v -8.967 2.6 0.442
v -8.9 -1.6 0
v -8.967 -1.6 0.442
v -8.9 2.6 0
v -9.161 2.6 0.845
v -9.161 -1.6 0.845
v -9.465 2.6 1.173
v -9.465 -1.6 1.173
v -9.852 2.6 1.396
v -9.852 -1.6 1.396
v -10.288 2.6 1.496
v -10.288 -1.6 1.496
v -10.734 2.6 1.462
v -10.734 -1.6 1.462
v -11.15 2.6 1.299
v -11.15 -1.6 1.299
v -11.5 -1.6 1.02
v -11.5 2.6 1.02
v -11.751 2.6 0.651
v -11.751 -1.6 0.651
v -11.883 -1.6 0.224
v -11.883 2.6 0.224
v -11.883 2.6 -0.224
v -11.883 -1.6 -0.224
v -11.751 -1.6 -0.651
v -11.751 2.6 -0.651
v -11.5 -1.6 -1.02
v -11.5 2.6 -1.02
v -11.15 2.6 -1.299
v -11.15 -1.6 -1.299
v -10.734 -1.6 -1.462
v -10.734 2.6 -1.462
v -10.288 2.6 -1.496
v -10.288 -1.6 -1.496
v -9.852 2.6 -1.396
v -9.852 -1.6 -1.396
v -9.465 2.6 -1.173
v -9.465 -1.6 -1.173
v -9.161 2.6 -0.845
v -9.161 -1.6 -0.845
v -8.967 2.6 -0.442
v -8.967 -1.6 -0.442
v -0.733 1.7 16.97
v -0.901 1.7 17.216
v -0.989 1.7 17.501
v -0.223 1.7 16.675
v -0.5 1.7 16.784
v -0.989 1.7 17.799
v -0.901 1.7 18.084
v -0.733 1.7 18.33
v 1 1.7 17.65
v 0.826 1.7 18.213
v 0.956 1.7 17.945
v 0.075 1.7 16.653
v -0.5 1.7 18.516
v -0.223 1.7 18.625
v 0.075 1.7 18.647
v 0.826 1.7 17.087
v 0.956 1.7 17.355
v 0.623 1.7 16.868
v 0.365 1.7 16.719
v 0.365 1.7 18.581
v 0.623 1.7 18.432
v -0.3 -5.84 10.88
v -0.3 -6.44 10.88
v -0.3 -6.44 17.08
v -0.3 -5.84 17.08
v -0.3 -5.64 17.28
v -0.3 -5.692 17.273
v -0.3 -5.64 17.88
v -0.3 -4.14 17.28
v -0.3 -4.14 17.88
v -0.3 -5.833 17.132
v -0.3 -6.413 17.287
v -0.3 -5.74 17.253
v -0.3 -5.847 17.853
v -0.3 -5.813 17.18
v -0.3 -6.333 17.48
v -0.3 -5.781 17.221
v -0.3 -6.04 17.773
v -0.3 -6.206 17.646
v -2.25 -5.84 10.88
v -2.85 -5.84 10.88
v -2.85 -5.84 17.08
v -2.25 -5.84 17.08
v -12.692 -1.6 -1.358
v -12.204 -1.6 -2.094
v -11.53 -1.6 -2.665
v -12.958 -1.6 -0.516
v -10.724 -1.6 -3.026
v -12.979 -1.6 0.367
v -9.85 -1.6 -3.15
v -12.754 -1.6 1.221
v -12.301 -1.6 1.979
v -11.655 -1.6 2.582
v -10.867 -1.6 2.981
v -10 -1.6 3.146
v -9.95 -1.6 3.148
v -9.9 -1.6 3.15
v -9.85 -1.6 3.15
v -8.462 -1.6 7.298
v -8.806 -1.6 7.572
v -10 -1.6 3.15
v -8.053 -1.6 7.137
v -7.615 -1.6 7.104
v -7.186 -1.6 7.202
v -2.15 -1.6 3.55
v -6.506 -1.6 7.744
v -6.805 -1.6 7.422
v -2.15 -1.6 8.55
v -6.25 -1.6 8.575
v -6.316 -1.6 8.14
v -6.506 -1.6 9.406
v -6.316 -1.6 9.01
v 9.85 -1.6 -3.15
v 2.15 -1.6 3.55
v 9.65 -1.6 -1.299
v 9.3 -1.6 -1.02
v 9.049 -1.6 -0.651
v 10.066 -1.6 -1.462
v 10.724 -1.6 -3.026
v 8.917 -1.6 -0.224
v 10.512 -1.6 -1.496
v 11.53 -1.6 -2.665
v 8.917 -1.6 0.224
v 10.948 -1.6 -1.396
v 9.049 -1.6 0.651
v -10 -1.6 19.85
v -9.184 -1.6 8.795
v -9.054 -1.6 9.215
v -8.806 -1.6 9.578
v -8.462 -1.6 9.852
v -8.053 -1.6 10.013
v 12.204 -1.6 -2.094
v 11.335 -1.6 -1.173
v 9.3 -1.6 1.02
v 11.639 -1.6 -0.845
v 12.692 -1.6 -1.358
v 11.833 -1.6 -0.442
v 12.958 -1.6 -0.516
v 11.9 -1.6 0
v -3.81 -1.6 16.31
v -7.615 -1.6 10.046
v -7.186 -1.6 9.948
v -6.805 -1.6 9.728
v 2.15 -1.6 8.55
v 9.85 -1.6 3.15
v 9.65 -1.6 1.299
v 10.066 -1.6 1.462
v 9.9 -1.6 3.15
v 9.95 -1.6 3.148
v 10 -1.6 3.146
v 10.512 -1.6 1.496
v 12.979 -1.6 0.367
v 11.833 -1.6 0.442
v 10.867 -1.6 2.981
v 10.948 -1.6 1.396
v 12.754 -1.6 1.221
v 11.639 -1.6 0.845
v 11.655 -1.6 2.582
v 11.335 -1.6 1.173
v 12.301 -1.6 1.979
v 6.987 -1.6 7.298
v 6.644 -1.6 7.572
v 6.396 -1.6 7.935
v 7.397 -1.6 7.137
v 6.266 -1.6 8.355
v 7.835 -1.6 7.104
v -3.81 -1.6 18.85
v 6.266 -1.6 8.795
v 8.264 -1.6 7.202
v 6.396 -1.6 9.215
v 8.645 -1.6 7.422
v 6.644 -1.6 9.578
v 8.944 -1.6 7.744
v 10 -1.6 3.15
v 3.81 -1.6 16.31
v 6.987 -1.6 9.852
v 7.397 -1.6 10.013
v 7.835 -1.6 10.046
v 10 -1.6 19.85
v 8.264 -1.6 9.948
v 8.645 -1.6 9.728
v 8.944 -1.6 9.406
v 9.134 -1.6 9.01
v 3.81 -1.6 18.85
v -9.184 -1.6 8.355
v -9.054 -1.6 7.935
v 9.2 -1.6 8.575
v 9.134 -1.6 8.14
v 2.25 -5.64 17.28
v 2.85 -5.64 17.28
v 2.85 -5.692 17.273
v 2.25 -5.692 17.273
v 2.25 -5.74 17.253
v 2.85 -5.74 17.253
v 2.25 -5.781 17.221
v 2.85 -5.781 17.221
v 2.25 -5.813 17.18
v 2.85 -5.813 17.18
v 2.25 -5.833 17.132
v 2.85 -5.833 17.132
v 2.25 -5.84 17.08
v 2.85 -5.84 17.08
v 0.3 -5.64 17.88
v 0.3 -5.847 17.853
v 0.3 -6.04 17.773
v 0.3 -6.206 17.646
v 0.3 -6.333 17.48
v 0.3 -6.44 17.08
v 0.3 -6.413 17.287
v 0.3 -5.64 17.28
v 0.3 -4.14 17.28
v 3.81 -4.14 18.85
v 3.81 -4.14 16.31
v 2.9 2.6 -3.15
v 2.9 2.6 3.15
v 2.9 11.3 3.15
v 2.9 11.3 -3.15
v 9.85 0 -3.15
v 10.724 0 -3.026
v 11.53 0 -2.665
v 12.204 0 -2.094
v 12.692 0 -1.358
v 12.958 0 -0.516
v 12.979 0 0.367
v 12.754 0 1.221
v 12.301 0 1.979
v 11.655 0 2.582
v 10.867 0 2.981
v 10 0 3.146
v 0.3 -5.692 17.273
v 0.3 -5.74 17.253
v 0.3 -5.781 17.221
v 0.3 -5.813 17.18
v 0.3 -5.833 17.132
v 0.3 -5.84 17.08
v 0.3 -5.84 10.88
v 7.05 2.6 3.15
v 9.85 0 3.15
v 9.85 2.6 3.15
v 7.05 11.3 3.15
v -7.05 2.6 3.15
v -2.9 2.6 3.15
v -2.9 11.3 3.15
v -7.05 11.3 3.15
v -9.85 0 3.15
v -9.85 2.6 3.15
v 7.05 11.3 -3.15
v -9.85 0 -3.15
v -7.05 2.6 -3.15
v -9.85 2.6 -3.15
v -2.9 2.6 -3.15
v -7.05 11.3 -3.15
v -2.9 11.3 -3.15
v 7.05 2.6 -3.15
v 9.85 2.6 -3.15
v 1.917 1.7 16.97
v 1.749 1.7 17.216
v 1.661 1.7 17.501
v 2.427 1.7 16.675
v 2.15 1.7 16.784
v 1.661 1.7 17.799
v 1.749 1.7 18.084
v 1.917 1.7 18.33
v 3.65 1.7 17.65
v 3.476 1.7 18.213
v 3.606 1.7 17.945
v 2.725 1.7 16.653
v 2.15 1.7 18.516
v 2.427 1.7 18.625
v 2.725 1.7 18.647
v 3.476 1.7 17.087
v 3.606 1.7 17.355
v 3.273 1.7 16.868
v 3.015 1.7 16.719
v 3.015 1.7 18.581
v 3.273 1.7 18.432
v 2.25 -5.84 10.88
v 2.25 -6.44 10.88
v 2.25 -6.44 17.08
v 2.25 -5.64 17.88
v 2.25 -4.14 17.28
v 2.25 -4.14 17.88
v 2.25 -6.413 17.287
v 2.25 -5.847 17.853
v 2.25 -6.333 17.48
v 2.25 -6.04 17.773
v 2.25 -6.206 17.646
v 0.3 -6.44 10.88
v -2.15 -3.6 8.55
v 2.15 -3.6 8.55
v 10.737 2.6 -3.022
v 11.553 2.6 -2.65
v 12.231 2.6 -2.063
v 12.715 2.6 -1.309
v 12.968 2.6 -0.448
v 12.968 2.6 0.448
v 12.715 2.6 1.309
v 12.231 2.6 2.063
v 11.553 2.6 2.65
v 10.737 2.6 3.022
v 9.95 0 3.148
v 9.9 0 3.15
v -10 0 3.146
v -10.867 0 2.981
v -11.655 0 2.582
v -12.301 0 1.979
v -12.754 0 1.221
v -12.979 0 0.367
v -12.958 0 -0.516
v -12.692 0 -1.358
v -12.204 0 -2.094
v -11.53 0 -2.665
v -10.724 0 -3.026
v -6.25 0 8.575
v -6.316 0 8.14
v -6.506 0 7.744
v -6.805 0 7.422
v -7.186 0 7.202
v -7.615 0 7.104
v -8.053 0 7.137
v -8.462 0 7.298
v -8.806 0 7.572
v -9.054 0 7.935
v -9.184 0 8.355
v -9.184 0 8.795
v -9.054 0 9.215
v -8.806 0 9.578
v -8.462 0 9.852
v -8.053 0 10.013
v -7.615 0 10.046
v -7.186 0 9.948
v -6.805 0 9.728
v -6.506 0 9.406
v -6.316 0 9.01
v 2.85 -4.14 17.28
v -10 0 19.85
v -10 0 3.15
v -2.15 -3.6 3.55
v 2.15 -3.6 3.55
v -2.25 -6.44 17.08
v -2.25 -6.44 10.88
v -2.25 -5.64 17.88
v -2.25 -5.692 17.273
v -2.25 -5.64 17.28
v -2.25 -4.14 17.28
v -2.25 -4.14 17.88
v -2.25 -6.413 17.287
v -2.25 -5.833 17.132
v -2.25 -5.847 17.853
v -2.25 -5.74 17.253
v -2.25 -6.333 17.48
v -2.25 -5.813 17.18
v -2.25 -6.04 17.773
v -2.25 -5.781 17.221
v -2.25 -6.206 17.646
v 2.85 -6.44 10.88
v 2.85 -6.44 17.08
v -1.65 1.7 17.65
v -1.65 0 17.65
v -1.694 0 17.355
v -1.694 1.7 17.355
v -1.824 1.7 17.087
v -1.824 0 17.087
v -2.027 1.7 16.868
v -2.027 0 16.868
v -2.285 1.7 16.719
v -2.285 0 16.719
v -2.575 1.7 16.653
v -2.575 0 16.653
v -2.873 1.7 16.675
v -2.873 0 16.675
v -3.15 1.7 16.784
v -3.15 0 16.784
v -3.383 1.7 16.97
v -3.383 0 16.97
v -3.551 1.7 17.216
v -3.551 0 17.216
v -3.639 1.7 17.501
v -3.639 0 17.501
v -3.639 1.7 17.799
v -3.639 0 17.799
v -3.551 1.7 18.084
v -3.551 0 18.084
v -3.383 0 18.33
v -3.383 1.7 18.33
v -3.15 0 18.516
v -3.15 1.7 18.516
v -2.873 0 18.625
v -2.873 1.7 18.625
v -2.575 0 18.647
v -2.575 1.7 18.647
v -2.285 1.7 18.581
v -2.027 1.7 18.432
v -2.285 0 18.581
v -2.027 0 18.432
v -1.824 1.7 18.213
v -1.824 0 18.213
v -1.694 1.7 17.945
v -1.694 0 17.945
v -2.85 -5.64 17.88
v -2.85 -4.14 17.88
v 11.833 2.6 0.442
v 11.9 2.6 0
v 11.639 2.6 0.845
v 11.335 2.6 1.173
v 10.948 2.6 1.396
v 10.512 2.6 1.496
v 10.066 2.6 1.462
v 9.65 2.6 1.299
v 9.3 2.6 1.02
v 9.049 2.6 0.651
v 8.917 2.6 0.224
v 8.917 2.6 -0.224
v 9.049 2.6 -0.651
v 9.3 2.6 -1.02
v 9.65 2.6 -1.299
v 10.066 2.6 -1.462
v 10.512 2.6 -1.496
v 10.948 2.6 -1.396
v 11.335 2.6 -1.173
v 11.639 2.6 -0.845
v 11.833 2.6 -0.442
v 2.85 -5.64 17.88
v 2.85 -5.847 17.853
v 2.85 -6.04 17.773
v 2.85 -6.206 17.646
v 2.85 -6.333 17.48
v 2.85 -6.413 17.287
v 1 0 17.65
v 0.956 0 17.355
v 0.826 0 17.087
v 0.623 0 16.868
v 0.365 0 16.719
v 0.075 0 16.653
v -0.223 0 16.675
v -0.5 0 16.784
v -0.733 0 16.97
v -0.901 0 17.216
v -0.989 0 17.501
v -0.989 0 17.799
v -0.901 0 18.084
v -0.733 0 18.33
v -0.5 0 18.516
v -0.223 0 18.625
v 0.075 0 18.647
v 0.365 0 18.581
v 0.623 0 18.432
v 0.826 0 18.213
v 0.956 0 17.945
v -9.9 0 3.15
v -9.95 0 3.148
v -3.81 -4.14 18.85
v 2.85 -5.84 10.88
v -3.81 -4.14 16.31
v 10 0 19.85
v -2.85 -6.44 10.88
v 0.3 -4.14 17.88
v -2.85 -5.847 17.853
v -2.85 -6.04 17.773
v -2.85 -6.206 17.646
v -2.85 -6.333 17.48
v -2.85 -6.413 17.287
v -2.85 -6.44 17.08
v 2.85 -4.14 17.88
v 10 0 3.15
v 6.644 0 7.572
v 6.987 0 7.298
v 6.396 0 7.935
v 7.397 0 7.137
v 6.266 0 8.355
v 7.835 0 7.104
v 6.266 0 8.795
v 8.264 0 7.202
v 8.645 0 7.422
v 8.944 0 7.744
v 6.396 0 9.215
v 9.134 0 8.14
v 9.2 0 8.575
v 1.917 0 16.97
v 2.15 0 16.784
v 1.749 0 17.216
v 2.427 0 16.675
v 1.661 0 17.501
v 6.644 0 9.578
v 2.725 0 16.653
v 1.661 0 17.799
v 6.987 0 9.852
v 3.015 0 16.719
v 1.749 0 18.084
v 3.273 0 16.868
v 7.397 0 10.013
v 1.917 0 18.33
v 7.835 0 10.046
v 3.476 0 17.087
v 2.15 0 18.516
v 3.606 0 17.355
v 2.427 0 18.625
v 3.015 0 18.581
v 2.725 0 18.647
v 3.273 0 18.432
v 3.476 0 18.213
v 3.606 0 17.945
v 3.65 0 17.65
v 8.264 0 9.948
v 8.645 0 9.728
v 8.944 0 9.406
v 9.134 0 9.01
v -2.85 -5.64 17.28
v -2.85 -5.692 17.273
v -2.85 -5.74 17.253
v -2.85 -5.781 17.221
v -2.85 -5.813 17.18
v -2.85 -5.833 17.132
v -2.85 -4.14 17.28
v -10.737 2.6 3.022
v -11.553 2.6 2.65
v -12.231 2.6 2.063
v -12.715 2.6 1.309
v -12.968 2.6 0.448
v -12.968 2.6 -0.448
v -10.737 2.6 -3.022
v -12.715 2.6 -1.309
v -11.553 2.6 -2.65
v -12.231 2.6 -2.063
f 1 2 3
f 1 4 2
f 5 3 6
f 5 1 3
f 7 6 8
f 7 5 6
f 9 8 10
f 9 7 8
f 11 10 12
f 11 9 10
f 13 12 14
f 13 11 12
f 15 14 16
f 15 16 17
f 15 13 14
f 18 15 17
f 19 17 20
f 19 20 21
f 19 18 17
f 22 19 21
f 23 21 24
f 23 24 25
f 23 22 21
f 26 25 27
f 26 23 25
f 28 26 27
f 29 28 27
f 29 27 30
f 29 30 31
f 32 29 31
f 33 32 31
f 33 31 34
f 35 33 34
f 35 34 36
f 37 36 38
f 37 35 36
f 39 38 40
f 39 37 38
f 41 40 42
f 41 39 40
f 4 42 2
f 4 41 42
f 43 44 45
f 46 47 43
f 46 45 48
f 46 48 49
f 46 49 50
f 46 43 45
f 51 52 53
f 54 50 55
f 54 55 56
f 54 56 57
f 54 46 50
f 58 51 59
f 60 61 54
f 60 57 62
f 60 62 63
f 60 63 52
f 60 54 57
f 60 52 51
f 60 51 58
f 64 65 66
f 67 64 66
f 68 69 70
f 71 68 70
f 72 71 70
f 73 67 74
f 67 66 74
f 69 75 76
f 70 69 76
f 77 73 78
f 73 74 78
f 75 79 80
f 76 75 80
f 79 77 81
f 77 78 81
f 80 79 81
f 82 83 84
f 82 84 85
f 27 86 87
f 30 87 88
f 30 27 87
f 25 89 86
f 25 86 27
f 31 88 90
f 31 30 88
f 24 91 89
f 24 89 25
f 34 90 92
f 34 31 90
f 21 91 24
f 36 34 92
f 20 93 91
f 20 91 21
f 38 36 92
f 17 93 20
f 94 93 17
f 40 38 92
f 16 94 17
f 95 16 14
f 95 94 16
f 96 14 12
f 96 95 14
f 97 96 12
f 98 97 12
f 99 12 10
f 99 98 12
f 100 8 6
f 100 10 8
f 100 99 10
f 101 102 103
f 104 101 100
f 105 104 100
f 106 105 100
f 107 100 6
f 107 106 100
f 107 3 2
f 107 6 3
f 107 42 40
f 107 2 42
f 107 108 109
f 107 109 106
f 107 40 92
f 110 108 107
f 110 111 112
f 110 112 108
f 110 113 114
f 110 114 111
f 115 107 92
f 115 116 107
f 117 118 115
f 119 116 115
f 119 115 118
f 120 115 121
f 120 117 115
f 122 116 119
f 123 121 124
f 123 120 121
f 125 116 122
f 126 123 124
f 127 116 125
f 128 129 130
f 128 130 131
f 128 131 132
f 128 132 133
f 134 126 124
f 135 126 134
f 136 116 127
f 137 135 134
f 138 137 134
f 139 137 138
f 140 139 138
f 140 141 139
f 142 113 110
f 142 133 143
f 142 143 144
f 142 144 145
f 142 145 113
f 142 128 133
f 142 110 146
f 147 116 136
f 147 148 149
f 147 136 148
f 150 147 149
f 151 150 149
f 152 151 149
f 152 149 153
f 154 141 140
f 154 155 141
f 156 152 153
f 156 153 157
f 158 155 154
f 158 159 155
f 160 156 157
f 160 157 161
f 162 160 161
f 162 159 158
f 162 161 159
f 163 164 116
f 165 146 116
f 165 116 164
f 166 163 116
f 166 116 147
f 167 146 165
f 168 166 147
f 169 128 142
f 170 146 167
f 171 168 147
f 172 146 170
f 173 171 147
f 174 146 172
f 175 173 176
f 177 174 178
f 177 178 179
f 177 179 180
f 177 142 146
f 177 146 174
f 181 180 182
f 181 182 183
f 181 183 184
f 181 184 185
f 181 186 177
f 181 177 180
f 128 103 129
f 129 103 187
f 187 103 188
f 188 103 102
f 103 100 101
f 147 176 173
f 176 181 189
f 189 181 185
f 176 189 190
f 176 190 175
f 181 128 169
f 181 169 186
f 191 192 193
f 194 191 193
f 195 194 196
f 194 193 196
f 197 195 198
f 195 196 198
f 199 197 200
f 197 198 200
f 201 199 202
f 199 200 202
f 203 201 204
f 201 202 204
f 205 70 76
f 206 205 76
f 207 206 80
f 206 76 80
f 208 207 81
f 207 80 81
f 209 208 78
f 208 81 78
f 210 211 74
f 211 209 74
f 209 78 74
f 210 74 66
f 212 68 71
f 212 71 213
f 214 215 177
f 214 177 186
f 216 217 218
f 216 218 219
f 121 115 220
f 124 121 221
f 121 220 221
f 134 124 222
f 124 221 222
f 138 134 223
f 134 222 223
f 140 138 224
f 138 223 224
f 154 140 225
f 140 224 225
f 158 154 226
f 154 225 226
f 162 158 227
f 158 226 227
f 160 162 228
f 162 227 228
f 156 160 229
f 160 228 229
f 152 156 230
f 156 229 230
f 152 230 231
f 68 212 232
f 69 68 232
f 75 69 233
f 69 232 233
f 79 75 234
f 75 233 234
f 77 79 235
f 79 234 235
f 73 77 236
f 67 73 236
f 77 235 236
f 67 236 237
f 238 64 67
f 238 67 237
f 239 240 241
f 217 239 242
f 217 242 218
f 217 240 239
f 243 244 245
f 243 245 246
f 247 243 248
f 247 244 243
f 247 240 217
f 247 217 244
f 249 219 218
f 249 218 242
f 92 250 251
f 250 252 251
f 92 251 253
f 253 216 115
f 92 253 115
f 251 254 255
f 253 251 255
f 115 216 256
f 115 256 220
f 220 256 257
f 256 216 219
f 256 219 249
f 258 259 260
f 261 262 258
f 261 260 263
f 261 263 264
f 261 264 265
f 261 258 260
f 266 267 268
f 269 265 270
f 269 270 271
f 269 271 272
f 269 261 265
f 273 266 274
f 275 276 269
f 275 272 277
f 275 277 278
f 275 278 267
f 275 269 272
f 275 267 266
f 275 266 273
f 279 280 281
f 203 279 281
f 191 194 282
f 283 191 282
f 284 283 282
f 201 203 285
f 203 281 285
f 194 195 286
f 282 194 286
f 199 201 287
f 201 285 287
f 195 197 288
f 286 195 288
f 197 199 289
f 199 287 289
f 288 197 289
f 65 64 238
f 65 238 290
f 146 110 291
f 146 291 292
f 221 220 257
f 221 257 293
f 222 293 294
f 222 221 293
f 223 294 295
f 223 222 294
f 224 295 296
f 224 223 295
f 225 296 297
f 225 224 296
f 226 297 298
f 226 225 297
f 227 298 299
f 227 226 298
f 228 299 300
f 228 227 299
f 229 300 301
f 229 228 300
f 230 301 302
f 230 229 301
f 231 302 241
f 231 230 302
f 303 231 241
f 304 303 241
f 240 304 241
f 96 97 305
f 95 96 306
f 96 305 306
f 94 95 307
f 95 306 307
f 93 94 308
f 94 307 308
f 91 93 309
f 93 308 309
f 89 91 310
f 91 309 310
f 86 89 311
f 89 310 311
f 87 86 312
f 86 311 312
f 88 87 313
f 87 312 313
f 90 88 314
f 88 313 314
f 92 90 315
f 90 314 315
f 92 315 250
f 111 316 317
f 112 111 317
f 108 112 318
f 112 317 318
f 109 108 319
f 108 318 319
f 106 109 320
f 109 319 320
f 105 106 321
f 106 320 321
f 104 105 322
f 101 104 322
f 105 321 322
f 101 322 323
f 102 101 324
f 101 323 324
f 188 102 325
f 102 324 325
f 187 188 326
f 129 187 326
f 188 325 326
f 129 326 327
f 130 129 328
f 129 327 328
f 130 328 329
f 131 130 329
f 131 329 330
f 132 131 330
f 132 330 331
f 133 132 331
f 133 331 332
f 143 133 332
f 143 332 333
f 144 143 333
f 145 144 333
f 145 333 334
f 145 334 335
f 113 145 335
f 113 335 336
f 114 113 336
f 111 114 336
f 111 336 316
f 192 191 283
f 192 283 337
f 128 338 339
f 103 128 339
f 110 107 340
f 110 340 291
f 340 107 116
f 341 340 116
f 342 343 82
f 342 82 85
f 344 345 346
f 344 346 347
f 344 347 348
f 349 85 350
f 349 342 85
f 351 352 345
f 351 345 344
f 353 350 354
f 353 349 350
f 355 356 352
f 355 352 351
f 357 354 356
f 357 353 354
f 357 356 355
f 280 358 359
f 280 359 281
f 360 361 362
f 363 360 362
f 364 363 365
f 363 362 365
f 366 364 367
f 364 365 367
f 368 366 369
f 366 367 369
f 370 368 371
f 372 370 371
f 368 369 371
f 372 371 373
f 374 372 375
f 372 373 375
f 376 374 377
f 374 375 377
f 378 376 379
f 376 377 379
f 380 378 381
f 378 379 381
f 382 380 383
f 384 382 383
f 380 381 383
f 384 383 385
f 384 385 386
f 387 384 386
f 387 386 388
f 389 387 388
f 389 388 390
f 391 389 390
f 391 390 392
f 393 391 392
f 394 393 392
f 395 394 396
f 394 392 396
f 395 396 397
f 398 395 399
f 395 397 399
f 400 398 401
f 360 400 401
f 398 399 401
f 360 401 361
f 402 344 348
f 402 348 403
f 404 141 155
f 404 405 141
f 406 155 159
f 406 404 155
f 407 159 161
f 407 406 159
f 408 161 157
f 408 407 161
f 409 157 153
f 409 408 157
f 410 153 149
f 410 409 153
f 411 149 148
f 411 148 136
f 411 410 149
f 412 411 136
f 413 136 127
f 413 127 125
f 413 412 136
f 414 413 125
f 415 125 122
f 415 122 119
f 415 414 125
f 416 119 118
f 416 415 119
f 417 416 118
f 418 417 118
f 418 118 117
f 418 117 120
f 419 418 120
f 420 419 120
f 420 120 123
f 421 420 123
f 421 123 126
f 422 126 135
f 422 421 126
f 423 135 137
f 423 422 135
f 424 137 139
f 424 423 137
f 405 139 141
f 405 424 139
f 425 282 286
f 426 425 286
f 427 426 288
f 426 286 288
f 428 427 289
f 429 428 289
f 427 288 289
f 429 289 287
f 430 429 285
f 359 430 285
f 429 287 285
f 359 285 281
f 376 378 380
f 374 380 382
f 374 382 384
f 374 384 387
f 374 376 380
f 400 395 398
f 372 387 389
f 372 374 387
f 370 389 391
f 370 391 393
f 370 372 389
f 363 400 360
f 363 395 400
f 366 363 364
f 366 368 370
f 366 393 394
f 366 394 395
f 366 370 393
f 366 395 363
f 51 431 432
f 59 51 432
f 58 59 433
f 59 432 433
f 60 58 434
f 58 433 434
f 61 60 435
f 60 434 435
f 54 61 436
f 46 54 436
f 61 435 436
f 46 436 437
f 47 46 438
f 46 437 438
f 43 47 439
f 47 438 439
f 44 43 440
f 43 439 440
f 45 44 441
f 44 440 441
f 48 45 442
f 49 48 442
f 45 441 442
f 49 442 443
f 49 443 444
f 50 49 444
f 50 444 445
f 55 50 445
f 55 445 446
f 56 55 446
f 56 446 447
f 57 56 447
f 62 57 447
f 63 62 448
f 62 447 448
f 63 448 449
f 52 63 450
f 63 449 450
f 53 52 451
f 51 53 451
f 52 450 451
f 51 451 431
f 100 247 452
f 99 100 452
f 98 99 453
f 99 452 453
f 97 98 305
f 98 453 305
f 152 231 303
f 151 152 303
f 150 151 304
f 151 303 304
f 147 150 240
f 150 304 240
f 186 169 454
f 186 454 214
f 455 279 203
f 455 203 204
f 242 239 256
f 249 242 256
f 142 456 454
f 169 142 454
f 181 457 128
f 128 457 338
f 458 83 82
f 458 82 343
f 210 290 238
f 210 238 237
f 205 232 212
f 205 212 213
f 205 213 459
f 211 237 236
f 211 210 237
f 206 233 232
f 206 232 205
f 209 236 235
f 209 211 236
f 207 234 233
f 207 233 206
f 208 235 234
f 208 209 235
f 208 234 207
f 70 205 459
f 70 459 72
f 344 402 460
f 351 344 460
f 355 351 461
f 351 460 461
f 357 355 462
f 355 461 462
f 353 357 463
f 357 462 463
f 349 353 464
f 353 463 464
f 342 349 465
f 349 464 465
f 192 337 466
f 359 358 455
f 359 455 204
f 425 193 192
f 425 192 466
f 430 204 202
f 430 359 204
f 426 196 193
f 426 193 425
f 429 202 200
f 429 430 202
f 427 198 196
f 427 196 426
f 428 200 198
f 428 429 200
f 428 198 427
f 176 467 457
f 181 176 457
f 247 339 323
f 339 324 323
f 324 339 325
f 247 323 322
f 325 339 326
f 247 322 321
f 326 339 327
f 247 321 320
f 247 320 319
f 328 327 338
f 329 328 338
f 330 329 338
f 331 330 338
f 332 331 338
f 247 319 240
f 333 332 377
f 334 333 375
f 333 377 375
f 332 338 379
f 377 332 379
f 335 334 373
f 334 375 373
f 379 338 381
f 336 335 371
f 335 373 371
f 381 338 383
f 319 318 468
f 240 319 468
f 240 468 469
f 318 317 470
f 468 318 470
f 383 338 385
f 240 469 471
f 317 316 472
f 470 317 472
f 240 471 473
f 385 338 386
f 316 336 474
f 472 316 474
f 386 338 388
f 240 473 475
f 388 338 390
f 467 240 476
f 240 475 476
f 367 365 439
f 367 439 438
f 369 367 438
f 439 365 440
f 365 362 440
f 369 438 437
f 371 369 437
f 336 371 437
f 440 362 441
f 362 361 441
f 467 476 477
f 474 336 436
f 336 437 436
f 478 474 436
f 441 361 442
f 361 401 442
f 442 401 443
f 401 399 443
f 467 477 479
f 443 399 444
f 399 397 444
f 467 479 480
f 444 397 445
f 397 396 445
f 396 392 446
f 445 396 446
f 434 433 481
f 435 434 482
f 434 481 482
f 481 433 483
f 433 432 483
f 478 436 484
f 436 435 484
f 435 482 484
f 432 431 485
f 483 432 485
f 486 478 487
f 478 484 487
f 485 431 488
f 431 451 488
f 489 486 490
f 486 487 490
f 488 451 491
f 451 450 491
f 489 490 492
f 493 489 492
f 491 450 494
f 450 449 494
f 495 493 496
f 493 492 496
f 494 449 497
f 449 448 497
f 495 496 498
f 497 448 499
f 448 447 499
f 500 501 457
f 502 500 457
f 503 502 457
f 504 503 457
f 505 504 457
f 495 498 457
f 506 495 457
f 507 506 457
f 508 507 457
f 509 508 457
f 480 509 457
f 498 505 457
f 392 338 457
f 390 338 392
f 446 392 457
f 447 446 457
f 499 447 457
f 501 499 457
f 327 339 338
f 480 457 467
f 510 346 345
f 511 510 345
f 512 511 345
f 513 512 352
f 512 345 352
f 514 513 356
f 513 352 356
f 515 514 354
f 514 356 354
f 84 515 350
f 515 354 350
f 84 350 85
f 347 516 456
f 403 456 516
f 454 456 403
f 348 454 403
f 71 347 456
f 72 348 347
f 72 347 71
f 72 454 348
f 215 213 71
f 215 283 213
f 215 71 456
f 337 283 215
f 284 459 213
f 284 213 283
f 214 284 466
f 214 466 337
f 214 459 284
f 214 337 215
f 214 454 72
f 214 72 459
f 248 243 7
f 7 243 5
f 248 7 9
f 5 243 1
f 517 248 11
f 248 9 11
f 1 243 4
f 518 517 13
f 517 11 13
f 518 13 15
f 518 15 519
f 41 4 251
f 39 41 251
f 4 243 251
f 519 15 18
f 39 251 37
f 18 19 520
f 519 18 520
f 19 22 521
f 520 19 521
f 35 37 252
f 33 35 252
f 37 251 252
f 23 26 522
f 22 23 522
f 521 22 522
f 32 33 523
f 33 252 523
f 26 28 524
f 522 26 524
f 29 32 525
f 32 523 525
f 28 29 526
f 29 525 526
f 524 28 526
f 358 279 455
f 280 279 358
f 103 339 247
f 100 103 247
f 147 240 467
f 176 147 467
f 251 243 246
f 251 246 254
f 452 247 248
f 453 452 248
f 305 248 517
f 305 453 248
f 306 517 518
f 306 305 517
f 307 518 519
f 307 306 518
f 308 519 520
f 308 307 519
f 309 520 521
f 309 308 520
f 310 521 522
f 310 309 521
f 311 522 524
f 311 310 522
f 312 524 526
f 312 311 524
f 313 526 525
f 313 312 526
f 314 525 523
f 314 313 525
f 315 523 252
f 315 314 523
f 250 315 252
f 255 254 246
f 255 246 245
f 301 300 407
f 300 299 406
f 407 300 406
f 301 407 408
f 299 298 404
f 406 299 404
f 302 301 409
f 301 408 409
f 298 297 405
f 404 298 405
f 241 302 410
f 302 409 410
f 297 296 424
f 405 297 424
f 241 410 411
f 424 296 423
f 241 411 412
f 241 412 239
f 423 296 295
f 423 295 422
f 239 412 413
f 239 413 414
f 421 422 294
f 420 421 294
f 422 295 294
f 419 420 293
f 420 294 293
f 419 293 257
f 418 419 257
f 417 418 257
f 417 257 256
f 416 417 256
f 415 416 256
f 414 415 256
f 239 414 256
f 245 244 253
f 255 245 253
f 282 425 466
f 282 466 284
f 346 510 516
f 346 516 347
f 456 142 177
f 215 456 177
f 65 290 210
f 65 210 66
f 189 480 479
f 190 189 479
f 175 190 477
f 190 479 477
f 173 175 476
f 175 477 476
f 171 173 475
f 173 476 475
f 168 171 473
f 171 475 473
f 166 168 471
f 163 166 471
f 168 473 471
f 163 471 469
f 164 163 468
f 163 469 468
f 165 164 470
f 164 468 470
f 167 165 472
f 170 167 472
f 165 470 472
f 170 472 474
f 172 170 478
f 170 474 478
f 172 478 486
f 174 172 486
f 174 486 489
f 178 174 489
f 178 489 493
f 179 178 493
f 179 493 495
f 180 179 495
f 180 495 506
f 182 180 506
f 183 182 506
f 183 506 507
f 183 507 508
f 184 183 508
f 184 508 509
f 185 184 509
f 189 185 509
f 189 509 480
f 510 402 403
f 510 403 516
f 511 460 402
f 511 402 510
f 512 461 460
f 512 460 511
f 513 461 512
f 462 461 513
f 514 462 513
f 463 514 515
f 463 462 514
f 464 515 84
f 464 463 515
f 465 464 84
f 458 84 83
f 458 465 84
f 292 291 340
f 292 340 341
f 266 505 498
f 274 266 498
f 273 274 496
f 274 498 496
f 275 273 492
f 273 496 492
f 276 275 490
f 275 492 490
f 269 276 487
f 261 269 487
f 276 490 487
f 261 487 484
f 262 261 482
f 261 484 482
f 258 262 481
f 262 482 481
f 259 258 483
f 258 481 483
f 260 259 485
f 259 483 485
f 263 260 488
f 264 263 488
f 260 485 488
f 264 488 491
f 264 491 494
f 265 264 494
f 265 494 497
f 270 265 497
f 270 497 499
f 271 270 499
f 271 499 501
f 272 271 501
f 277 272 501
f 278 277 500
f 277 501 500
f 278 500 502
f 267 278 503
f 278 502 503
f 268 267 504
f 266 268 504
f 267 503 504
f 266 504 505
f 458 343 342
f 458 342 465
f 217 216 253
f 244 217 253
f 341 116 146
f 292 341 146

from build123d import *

# Parameters (mm, degrees)
SKETCH1_R           = 1.5
BOSS_EXTRUDE1_DEPTH = 2.6
SKETCH2_W           = 4.15
SKETCH2_H           = 6.3
BOSS_EXTRUDE2_DEPTH = 8.7
SKETCH3_R           = 1.5
BOSS_EXTRUDE3_DEPTH = 1.6
SKETCH4_R           = 1
BOSS_EXTRUDE4_DEPTH = 1.7
SKETCH5_R           = 1.475
CUT_EXTRUDE1_DEPTH  = 2.6
SKETCH6_W           = 4.3
SKETCH6_H           = 5
BOSS_EXTRUDE5_DEPTH = 2
SKETCH7_W           = 7.62
SKETCH7_H           = 2.54
BOSS_EXTRUDE6_DEPTH = 2.54
SKETCH9_W           = 5.7
SKETCH9_H           = 0.6
SKETCH10_W          = 1.95
SKETCH10_H          = 7
CUT_EXTRUDE2_DEPTH  = 2.3


with BuildPart() as part:
    # Sketch1 → Boss-Extrude1 (new body)
    with BuildSketch(Plane(origin=(0, 0, 0), x_dir=(1, 0, 0), z_dir=(0, 1, 0))):
        with BuildLine():
            Line((-9.85, 3.15), (9.85, 3.15))
            ThreePointArc((9.85, 3.15), (13, 0), (9.85, -3.15))
            Line((9.85, -3.15), (-9.85, -3.15))
            ThreePointArc((-9.85, -3.15), (-13, 0), (-9.85, 3.15))
        make_face()
        with Locations((-10.4, 0)):
            Circle(SKETCH1_R, mode=Mode.SUBTRACT)
        with Locations((10.4, 0)):
            Circle(SKETCH1_R, mode=Mode.SUBTRACT)
    extrude(amount=BOSS_EXTRUDE1_DEPTH)

    # Sketch2 → Boss-Extrude2 (add)
    with BuildSketch(Plane(origin=(0, 2.6, 0), x_dir=(1, 0, 0), z_dir=(0, 1, 0))):
        with Locations((-4.975, 0)):
            Rectangle(SKETCH2_W, SKETCH2_H)
        with Locations((4.975, 0)):
            Rectangle(SKETCH2_W, SKETCH2_H)
    extrude(amount=BOSS_EXTRUDE2_DEPTH)

    # Sketch3 → Boss-Extrude3 (add)
    with BuildSketch(Plane.XZ):
        Polygon((-10, 19.85), (-10, 3.15), (-9.85, 3.15), (9.85, 3.15), (10, 3.15), (10, 19.85), align=None)
        with BuildLine():
            ThreePointArc((-9.85, 3.15), (-9.92502128, 3.149106509), (-10, 3.146426545))
            Line((-10, 3.146426545), (-10, 2.175870499))
            Line((-10, 2.175870499), (10, 2.175870499))
            Line((10, 2.175870499), (10, 3.146426545))
            ThreePointArc((10, 3.146426545), (9.92502128, 3.149106509), (9.85, 3.15))
            Line((9.85, 3.15), (-9.85, 3.15))
        make_face()
        with BuildLine():
            ThreePointArc((-10, 3.146426545), (-12.999106509, -0.07502128), (-9.85, -3.15))
            Line((-9.85, -3.15), (9.85, -3.15))
            ThreePointArc((9.85, -3.15), (12.999106509, -0.07502128), (10, 3.146426545))
            Line((10, 3.146426545), (10, 2.175870499))
            Line((10, 2.175870499), (-10, 2.175870499))
            Line((-10, 2.175870499), (-10, 3.146426545))
        make_face()
        with Locations((-10.4, 0)):
            Circle(SKETCH3_R, mode=Mode.SUBTRACT)
        with Locations((10.4, 0)):
            Circle(SKETCH3_R, mode=Mode.SUBTRACT)
    extrude(amount=BOSS_EXTRUDE3_DEPTH)

    # Sketch4 → Boss-Extrude4 (add)
    with BuildSketch(Plane(origin=(0, 0, 0), x_dir=(1, 0, 0), z_dir=(0, 1, 0))):
        with Locations((0, -17.65)):
            Circle(SKETCH4_R)
        with Locations((2.65, -17.65)):
            Circle(SKETCH4_R)
        with Locations((-2.65, -17.65)):
            Circle(SKETCH4_R)
    extrude(amount=BOSS_EXTRUDE4_DEPTH)

    # Sketch5 → Cut-Extrude1 (cut, through all)
    with BuildSketch(Plane(origin=(0, 0, 0), x_dir=(1, 0, 0), z_dir=(0, 1, 0))):
        with Locations((-7.725, -8.575)):
            Circle(SKETCH5_R)
        with Locations((7.725, -8.575)):
            Circle(SKETCH5_R)
    extrude(amount=-CUT_EXTRUDE1_DEPTH, mode=Mode.SUBTRACT)

    # Sketch6 → Boss-Extrude5 (add)
    with BuildSketch(Plane.XZ.offset(1.6)):
        with Locations((0, 6.05)):
            Rectangle(SKETCH6_W, SKETCH6_H)
    extrude(amount=BOSS_EXTRUDE5_DEPTH)

    # Sketch7 → Boss-Extrude6 (add)
    with BuildSketch(Plane.XZ.offset(1.6)):
        with Locations((0, 17.58)):
            Rectangle(SKETCH7_W, SKETCH7_H)
    extrude(amount=BOSS_EXTRUDE6_DEPTH)

    # Sweep1: sweep along a path in Sketch8
    with BuildLine(Plane(origin=(0, 0, 0), x_dir=(0, 0, -1), z_dir=(1, 0, 0))) as sweep1_path:
        Line((-17.58, -4.14), (-17.58, -5.64))
        ThreePointArc((-17.58, -5.64), (-17.433553391, -5.993553391), (-17.08, -6.14))
        Line((-17.08, -6.14), (-10.88, -6.14))
    # Sketch9 → Sweep1 (sweep)
    with BuildSketch(Plane.XZ.offset(4.14)):
        with Locations((0, 17.58)):
            Rectangle(SKETCH9_W, SKETCH9_H)
    sweep(path=sweep1_path.line)

    # Sketch10 → Cut-Extrude2 (cut)
    with BuildSketch(Plane.XZ.offset(6.44)):
        with Locations((-1.275, 14.38)):
            Rectangle(SKETCH10_W, SKETCH10_H)
        with Locations((1.275, 14.38)):
            Rectangle(SKETCH10_W, SKETCH10_H)
    extrude(amount=-CUT_EXTRUDE2_DEPTH, mode=Mode.SUBTRACT)


solid = part.part
